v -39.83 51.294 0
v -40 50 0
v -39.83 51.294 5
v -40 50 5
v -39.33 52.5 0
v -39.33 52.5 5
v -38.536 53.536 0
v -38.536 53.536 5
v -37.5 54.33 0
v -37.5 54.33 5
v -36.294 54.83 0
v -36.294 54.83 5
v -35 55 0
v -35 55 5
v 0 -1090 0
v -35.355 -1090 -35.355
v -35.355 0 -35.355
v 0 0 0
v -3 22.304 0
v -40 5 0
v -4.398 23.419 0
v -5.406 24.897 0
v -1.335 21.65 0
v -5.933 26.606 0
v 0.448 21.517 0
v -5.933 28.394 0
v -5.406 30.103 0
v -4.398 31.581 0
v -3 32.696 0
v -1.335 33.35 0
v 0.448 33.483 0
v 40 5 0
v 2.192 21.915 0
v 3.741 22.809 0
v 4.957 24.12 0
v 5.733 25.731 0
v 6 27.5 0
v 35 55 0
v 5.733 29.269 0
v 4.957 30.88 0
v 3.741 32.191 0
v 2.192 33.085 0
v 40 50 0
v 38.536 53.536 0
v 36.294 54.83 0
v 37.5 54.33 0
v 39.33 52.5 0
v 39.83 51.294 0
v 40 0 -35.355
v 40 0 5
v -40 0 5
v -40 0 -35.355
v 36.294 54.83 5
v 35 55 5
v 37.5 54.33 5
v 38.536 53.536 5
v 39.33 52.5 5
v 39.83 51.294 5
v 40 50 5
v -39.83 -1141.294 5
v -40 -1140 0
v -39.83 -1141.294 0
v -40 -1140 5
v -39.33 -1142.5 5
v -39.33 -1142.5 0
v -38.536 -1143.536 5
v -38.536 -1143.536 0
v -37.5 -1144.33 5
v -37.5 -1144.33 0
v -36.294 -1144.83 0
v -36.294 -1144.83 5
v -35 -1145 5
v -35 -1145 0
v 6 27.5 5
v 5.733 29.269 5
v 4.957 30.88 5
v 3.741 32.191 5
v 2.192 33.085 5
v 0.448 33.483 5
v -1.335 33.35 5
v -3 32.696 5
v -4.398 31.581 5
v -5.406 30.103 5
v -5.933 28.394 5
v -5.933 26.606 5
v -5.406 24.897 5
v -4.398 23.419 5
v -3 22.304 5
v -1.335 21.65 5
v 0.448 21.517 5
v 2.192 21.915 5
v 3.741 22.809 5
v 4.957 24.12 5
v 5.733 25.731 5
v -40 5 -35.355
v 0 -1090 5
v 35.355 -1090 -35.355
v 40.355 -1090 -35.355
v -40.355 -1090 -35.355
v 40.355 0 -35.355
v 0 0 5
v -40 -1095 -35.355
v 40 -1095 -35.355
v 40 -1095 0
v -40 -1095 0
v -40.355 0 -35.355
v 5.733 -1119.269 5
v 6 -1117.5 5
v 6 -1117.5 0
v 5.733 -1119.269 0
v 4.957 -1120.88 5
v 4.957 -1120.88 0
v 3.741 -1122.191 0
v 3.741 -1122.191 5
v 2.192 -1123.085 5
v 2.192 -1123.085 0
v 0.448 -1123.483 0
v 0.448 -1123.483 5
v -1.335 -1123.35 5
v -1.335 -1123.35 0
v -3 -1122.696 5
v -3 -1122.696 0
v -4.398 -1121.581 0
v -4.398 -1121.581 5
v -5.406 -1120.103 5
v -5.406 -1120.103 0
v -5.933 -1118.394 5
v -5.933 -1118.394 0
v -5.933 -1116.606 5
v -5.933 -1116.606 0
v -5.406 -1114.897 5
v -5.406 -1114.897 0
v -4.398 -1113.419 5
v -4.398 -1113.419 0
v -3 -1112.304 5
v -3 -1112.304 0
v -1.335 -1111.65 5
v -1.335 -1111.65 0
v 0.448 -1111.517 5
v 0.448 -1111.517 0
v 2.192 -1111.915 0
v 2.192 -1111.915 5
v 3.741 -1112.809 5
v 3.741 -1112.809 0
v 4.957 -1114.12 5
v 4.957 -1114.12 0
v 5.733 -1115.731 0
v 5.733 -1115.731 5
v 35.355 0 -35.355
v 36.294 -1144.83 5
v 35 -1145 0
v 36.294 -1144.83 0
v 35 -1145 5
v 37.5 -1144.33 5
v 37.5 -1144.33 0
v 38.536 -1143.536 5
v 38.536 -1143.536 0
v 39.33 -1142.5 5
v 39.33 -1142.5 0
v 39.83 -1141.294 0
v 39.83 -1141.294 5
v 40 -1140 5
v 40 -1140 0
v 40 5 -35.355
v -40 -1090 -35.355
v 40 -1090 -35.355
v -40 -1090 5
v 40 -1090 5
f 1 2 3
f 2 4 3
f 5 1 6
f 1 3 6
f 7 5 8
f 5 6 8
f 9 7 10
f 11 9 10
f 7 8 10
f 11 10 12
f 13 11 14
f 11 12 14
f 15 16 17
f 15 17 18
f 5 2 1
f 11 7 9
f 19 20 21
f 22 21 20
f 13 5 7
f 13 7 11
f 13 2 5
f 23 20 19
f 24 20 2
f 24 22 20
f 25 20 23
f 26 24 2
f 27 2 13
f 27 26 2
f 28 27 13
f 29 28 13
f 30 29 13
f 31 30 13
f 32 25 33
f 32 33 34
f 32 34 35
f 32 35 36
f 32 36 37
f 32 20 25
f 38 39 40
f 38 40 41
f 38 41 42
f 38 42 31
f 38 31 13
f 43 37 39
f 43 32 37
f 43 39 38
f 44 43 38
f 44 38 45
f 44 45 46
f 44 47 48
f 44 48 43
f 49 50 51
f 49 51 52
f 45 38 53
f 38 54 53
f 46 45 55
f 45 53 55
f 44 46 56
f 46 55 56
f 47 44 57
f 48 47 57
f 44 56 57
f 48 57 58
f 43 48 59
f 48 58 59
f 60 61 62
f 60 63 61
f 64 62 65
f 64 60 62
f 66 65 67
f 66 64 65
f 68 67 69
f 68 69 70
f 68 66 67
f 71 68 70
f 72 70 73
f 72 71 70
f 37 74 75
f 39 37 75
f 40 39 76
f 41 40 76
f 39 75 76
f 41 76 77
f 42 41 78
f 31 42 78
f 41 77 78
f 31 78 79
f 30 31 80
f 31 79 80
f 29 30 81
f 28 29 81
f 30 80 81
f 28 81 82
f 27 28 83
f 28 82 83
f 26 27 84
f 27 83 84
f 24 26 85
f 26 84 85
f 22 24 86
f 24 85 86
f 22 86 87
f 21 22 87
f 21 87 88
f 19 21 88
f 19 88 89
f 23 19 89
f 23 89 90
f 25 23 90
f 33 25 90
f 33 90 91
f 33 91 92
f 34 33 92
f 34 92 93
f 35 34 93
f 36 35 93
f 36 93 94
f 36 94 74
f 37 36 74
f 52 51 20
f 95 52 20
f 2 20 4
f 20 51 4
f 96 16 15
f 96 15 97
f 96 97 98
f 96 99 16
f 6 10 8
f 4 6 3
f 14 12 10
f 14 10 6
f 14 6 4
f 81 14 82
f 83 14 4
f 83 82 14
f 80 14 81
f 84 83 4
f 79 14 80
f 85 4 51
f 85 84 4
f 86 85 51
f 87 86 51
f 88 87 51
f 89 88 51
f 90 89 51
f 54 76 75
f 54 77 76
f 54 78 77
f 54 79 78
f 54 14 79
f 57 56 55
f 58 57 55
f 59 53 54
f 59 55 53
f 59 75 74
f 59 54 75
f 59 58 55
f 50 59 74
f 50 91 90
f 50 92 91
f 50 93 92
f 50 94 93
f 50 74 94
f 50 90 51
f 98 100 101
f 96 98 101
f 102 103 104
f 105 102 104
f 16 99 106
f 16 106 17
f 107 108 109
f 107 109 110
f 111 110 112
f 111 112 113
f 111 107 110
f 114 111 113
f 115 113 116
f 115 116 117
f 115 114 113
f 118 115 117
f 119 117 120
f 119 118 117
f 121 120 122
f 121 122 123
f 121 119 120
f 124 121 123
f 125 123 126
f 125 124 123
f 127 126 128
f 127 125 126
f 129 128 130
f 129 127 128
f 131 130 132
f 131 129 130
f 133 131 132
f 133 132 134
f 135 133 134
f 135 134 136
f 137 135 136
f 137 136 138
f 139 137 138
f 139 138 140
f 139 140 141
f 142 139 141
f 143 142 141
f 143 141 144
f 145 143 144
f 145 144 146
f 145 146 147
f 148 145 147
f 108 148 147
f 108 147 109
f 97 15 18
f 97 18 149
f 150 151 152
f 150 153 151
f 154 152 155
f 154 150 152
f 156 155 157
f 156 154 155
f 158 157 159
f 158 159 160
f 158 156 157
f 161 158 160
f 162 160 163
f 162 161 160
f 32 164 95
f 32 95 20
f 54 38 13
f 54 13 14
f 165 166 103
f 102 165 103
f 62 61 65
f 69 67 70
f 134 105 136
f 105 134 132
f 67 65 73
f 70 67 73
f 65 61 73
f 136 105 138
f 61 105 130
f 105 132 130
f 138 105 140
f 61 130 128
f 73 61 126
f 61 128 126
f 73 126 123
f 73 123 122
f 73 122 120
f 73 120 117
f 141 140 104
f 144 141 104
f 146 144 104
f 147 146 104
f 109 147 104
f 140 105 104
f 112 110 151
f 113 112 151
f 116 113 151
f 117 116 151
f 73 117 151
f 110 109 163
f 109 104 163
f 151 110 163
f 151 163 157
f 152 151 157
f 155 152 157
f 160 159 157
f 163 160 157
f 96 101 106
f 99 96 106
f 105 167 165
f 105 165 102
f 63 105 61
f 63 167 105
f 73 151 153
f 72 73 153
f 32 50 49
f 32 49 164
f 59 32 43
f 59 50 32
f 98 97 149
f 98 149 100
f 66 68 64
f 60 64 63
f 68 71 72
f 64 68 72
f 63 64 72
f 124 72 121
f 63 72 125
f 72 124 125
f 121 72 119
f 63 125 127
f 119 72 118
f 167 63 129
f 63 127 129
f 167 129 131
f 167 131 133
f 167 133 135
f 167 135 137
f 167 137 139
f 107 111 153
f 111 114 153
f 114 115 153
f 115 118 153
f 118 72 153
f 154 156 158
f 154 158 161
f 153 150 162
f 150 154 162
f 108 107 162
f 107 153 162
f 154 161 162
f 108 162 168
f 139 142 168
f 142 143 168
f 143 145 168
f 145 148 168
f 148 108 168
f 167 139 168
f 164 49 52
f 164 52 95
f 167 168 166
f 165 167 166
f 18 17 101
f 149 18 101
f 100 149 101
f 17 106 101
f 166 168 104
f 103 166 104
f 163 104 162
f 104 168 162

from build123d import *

# Parameters (mm, degrees)
F1_DEPTH = 1090
F3_DEPTH = 40
F4_R     = 6
F5_DEPTH = 25
F8_R     = 5


with BuildPart() as f1:
    # F0 (on Front) → F1 (new body)
    with BuildSketch(Plane.XZ):
        Polygon((-35.355339, -35.355339), (0, 0), (35.355339, -35.355339), (40.355339, -35.355339), (0, 5), (-40.355339, -35.355339), align=None)
    extrude(amount=F1_DEPTH)


with BuildPart() as f3:
    # F2 (on Right) → F3 (new body, symmetric)
    with BuildSketch(Plane.YZ):
        Polygon((55, 5), (0, 5), (0, -35.355339), (5, -35.355339), (5, 0), (55, 0), align=None)
    extrude(amount=F3_DEPTH, both=True)

    # F4 (on face) → F5 (cut)
    with BuildSketch(Plane.XY.offset(5)):
        with Locations((0, 27.5)):
            Circle(F4_R)
    extrude(amount=-F5_DEPTH, mode=Mode.SUBTRACT)

    # F8
    f8_edges = [f3.edges().sort_by_distance(p)[0] for p in [
        (-40, 55, 2.5),
        (40, 55, 2.5),
    ]]
    fillet(f8_edges, radius=F8_R)


with BuildPart() as f7_1:
    # F7: instance of F3
    add(f3.part.mirror(Plane.XZ.offset(545)))


solid = Compound([f1.part, f3.part, f7_1.part])
